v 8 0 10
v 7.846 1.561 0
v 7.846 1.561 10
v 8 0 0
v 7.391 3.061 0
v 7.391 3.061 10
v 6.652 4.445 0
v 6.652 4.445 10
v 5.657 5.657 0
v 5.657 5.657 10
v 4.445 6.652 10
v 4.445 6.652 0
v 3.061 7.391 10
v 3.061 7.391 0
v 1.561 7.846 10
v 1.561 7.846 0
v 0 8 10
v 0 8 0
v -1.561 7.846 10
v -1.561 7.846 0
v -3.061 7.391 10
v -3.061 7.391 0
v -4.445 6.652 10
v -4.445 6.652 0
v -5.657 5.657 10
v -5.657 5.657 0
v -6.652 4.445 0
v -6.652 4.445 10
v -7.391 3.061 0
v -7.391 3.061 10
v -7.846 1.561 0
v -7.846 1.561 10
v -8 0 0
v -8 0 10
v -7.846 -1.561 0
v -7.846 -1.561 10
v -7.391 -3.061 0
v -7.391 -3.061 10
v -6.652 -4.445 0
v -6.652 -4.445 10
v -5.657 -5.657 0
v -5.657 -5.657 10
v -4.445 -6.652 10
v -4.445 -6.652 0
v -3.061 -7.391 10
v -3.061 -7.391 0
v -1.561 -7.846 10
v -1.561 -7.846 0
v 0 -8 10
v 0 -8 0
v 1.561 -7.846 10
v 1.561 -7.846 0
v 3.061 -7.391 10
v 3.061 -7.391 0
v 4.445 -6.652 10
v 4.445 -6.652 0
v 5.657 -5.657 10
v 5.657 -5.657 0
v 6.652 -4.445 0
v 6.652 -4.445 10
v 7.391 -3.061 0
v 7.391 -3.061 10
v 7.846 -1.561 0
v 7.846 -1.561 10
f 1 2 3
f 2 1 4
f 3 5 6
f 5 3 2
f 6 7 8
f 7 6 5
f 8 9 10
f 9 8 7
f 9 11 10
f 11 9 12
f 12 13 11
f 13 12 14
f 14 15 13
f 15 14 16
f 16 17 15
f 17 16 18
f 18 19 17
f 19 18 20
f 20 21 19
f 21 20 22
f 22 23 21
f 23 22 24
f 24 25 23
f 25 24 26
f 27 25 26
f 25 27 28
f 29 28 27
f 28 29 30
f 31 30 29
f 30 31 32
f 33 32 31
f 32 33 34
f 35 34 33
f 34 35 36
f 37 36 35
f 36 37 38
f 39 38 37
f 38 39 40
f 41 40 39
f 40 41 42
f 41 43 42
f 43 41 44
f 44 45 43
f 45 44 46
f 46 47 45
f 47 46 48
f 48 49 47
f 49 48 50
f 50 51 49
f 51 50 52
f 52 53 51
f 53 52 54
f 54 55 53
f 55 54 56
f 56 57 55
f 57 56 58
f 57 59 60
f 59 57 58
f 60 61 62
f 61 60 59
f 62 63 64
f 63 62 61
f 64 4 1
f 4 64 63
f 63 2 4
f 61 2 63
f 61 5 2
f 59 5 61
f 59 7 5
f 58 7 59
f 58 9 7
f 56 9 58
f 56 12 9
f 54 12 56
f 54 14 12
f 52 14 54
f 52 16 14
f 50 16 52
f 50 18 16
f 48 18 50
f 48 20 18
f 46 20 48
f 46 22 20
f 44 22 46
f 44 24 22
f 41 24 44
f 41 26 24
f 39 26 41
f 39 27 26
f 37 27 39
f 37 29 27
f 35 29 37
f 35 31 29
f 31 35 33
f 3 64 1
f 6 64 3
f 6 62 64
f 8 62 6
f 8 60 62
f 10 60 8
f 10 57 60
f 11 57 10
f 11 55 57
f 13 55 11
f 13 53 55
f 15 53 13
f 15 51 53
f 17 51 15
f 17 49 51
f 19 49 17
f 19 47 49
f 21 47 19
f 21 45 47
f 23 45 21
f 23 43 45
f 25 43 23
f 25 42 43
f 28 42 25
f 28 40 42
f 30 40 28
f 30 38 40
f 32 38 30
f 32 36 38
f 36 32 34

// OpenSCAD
// A cylinder that does not go all the way round.
//
// `cylinder(angle = ...)` used to declare no surface, on the reasoning that a
// pie slice has flat sides which are not part of the cylinder. That is true and
// it was the wrong place to act on it: the flat sides run through the axis, so
// they fit no cylinder and the recogniser discards them on the fit by itself.
// Excluding the whole primitive threw the curved wall away with them.
//
// The exclusion also predates partial cylinders. When it was written a band had
// to close on itself to be written at all, so a 90 degree wall was of no use
// even if it had been declared; that has not been true for two rounds.
//
// This fixture also guards the parse. `angle` was in cylinder()'s parameter
// list and was then dropped on the floor, so a .scad file asking for 90 degrees
// silently got 360 - only the Python binding ever set it. The first version of
// this fixture therefore passed while testing nothing, and the giveaway was in
// the exporter's own report: a pie slice whose wall comes out as a *closed*
// band is not a pie slice.
//
// Expected: 5 faces - one CYLINDRICAL_SURFACE bounded by an arc at either rim
// and the band's two straight ends, the two flat sides, and the two pie shaped
// end faces. At $fn = 32 the ring is generated with one extra vertex on the
// axis, so of its 33 side quads one at each end is flat and 31 are collapsed.
// The report has to say *1 partial*; a closed band means `angle` was ignored
// again.
//
// Measured, and asserted by the driver: what the exporter has to report for
// the above to have happened. A silently faceted export is still a valid one,
// so validity alone cannot see a recogniser that has stopped recognising.
// EXPECT: 1 analytic surface available (1 cylindrical, 0 spherical, 0 toroidal, 0 Bezier)
// EXPECT: 1 surface recognised (0 toroidal, 0 spherical, 0 conical, 1 partial), 31 facets replaced
//
// A quarter of pi*8^2*10, which is 160*pi.
// ROUNDTRIP: Cylinder=1 Plane=4
// VOLUME: 502.6548246
$fn = 32;
cylinder(h = 10, r = 8, angle = 90);
